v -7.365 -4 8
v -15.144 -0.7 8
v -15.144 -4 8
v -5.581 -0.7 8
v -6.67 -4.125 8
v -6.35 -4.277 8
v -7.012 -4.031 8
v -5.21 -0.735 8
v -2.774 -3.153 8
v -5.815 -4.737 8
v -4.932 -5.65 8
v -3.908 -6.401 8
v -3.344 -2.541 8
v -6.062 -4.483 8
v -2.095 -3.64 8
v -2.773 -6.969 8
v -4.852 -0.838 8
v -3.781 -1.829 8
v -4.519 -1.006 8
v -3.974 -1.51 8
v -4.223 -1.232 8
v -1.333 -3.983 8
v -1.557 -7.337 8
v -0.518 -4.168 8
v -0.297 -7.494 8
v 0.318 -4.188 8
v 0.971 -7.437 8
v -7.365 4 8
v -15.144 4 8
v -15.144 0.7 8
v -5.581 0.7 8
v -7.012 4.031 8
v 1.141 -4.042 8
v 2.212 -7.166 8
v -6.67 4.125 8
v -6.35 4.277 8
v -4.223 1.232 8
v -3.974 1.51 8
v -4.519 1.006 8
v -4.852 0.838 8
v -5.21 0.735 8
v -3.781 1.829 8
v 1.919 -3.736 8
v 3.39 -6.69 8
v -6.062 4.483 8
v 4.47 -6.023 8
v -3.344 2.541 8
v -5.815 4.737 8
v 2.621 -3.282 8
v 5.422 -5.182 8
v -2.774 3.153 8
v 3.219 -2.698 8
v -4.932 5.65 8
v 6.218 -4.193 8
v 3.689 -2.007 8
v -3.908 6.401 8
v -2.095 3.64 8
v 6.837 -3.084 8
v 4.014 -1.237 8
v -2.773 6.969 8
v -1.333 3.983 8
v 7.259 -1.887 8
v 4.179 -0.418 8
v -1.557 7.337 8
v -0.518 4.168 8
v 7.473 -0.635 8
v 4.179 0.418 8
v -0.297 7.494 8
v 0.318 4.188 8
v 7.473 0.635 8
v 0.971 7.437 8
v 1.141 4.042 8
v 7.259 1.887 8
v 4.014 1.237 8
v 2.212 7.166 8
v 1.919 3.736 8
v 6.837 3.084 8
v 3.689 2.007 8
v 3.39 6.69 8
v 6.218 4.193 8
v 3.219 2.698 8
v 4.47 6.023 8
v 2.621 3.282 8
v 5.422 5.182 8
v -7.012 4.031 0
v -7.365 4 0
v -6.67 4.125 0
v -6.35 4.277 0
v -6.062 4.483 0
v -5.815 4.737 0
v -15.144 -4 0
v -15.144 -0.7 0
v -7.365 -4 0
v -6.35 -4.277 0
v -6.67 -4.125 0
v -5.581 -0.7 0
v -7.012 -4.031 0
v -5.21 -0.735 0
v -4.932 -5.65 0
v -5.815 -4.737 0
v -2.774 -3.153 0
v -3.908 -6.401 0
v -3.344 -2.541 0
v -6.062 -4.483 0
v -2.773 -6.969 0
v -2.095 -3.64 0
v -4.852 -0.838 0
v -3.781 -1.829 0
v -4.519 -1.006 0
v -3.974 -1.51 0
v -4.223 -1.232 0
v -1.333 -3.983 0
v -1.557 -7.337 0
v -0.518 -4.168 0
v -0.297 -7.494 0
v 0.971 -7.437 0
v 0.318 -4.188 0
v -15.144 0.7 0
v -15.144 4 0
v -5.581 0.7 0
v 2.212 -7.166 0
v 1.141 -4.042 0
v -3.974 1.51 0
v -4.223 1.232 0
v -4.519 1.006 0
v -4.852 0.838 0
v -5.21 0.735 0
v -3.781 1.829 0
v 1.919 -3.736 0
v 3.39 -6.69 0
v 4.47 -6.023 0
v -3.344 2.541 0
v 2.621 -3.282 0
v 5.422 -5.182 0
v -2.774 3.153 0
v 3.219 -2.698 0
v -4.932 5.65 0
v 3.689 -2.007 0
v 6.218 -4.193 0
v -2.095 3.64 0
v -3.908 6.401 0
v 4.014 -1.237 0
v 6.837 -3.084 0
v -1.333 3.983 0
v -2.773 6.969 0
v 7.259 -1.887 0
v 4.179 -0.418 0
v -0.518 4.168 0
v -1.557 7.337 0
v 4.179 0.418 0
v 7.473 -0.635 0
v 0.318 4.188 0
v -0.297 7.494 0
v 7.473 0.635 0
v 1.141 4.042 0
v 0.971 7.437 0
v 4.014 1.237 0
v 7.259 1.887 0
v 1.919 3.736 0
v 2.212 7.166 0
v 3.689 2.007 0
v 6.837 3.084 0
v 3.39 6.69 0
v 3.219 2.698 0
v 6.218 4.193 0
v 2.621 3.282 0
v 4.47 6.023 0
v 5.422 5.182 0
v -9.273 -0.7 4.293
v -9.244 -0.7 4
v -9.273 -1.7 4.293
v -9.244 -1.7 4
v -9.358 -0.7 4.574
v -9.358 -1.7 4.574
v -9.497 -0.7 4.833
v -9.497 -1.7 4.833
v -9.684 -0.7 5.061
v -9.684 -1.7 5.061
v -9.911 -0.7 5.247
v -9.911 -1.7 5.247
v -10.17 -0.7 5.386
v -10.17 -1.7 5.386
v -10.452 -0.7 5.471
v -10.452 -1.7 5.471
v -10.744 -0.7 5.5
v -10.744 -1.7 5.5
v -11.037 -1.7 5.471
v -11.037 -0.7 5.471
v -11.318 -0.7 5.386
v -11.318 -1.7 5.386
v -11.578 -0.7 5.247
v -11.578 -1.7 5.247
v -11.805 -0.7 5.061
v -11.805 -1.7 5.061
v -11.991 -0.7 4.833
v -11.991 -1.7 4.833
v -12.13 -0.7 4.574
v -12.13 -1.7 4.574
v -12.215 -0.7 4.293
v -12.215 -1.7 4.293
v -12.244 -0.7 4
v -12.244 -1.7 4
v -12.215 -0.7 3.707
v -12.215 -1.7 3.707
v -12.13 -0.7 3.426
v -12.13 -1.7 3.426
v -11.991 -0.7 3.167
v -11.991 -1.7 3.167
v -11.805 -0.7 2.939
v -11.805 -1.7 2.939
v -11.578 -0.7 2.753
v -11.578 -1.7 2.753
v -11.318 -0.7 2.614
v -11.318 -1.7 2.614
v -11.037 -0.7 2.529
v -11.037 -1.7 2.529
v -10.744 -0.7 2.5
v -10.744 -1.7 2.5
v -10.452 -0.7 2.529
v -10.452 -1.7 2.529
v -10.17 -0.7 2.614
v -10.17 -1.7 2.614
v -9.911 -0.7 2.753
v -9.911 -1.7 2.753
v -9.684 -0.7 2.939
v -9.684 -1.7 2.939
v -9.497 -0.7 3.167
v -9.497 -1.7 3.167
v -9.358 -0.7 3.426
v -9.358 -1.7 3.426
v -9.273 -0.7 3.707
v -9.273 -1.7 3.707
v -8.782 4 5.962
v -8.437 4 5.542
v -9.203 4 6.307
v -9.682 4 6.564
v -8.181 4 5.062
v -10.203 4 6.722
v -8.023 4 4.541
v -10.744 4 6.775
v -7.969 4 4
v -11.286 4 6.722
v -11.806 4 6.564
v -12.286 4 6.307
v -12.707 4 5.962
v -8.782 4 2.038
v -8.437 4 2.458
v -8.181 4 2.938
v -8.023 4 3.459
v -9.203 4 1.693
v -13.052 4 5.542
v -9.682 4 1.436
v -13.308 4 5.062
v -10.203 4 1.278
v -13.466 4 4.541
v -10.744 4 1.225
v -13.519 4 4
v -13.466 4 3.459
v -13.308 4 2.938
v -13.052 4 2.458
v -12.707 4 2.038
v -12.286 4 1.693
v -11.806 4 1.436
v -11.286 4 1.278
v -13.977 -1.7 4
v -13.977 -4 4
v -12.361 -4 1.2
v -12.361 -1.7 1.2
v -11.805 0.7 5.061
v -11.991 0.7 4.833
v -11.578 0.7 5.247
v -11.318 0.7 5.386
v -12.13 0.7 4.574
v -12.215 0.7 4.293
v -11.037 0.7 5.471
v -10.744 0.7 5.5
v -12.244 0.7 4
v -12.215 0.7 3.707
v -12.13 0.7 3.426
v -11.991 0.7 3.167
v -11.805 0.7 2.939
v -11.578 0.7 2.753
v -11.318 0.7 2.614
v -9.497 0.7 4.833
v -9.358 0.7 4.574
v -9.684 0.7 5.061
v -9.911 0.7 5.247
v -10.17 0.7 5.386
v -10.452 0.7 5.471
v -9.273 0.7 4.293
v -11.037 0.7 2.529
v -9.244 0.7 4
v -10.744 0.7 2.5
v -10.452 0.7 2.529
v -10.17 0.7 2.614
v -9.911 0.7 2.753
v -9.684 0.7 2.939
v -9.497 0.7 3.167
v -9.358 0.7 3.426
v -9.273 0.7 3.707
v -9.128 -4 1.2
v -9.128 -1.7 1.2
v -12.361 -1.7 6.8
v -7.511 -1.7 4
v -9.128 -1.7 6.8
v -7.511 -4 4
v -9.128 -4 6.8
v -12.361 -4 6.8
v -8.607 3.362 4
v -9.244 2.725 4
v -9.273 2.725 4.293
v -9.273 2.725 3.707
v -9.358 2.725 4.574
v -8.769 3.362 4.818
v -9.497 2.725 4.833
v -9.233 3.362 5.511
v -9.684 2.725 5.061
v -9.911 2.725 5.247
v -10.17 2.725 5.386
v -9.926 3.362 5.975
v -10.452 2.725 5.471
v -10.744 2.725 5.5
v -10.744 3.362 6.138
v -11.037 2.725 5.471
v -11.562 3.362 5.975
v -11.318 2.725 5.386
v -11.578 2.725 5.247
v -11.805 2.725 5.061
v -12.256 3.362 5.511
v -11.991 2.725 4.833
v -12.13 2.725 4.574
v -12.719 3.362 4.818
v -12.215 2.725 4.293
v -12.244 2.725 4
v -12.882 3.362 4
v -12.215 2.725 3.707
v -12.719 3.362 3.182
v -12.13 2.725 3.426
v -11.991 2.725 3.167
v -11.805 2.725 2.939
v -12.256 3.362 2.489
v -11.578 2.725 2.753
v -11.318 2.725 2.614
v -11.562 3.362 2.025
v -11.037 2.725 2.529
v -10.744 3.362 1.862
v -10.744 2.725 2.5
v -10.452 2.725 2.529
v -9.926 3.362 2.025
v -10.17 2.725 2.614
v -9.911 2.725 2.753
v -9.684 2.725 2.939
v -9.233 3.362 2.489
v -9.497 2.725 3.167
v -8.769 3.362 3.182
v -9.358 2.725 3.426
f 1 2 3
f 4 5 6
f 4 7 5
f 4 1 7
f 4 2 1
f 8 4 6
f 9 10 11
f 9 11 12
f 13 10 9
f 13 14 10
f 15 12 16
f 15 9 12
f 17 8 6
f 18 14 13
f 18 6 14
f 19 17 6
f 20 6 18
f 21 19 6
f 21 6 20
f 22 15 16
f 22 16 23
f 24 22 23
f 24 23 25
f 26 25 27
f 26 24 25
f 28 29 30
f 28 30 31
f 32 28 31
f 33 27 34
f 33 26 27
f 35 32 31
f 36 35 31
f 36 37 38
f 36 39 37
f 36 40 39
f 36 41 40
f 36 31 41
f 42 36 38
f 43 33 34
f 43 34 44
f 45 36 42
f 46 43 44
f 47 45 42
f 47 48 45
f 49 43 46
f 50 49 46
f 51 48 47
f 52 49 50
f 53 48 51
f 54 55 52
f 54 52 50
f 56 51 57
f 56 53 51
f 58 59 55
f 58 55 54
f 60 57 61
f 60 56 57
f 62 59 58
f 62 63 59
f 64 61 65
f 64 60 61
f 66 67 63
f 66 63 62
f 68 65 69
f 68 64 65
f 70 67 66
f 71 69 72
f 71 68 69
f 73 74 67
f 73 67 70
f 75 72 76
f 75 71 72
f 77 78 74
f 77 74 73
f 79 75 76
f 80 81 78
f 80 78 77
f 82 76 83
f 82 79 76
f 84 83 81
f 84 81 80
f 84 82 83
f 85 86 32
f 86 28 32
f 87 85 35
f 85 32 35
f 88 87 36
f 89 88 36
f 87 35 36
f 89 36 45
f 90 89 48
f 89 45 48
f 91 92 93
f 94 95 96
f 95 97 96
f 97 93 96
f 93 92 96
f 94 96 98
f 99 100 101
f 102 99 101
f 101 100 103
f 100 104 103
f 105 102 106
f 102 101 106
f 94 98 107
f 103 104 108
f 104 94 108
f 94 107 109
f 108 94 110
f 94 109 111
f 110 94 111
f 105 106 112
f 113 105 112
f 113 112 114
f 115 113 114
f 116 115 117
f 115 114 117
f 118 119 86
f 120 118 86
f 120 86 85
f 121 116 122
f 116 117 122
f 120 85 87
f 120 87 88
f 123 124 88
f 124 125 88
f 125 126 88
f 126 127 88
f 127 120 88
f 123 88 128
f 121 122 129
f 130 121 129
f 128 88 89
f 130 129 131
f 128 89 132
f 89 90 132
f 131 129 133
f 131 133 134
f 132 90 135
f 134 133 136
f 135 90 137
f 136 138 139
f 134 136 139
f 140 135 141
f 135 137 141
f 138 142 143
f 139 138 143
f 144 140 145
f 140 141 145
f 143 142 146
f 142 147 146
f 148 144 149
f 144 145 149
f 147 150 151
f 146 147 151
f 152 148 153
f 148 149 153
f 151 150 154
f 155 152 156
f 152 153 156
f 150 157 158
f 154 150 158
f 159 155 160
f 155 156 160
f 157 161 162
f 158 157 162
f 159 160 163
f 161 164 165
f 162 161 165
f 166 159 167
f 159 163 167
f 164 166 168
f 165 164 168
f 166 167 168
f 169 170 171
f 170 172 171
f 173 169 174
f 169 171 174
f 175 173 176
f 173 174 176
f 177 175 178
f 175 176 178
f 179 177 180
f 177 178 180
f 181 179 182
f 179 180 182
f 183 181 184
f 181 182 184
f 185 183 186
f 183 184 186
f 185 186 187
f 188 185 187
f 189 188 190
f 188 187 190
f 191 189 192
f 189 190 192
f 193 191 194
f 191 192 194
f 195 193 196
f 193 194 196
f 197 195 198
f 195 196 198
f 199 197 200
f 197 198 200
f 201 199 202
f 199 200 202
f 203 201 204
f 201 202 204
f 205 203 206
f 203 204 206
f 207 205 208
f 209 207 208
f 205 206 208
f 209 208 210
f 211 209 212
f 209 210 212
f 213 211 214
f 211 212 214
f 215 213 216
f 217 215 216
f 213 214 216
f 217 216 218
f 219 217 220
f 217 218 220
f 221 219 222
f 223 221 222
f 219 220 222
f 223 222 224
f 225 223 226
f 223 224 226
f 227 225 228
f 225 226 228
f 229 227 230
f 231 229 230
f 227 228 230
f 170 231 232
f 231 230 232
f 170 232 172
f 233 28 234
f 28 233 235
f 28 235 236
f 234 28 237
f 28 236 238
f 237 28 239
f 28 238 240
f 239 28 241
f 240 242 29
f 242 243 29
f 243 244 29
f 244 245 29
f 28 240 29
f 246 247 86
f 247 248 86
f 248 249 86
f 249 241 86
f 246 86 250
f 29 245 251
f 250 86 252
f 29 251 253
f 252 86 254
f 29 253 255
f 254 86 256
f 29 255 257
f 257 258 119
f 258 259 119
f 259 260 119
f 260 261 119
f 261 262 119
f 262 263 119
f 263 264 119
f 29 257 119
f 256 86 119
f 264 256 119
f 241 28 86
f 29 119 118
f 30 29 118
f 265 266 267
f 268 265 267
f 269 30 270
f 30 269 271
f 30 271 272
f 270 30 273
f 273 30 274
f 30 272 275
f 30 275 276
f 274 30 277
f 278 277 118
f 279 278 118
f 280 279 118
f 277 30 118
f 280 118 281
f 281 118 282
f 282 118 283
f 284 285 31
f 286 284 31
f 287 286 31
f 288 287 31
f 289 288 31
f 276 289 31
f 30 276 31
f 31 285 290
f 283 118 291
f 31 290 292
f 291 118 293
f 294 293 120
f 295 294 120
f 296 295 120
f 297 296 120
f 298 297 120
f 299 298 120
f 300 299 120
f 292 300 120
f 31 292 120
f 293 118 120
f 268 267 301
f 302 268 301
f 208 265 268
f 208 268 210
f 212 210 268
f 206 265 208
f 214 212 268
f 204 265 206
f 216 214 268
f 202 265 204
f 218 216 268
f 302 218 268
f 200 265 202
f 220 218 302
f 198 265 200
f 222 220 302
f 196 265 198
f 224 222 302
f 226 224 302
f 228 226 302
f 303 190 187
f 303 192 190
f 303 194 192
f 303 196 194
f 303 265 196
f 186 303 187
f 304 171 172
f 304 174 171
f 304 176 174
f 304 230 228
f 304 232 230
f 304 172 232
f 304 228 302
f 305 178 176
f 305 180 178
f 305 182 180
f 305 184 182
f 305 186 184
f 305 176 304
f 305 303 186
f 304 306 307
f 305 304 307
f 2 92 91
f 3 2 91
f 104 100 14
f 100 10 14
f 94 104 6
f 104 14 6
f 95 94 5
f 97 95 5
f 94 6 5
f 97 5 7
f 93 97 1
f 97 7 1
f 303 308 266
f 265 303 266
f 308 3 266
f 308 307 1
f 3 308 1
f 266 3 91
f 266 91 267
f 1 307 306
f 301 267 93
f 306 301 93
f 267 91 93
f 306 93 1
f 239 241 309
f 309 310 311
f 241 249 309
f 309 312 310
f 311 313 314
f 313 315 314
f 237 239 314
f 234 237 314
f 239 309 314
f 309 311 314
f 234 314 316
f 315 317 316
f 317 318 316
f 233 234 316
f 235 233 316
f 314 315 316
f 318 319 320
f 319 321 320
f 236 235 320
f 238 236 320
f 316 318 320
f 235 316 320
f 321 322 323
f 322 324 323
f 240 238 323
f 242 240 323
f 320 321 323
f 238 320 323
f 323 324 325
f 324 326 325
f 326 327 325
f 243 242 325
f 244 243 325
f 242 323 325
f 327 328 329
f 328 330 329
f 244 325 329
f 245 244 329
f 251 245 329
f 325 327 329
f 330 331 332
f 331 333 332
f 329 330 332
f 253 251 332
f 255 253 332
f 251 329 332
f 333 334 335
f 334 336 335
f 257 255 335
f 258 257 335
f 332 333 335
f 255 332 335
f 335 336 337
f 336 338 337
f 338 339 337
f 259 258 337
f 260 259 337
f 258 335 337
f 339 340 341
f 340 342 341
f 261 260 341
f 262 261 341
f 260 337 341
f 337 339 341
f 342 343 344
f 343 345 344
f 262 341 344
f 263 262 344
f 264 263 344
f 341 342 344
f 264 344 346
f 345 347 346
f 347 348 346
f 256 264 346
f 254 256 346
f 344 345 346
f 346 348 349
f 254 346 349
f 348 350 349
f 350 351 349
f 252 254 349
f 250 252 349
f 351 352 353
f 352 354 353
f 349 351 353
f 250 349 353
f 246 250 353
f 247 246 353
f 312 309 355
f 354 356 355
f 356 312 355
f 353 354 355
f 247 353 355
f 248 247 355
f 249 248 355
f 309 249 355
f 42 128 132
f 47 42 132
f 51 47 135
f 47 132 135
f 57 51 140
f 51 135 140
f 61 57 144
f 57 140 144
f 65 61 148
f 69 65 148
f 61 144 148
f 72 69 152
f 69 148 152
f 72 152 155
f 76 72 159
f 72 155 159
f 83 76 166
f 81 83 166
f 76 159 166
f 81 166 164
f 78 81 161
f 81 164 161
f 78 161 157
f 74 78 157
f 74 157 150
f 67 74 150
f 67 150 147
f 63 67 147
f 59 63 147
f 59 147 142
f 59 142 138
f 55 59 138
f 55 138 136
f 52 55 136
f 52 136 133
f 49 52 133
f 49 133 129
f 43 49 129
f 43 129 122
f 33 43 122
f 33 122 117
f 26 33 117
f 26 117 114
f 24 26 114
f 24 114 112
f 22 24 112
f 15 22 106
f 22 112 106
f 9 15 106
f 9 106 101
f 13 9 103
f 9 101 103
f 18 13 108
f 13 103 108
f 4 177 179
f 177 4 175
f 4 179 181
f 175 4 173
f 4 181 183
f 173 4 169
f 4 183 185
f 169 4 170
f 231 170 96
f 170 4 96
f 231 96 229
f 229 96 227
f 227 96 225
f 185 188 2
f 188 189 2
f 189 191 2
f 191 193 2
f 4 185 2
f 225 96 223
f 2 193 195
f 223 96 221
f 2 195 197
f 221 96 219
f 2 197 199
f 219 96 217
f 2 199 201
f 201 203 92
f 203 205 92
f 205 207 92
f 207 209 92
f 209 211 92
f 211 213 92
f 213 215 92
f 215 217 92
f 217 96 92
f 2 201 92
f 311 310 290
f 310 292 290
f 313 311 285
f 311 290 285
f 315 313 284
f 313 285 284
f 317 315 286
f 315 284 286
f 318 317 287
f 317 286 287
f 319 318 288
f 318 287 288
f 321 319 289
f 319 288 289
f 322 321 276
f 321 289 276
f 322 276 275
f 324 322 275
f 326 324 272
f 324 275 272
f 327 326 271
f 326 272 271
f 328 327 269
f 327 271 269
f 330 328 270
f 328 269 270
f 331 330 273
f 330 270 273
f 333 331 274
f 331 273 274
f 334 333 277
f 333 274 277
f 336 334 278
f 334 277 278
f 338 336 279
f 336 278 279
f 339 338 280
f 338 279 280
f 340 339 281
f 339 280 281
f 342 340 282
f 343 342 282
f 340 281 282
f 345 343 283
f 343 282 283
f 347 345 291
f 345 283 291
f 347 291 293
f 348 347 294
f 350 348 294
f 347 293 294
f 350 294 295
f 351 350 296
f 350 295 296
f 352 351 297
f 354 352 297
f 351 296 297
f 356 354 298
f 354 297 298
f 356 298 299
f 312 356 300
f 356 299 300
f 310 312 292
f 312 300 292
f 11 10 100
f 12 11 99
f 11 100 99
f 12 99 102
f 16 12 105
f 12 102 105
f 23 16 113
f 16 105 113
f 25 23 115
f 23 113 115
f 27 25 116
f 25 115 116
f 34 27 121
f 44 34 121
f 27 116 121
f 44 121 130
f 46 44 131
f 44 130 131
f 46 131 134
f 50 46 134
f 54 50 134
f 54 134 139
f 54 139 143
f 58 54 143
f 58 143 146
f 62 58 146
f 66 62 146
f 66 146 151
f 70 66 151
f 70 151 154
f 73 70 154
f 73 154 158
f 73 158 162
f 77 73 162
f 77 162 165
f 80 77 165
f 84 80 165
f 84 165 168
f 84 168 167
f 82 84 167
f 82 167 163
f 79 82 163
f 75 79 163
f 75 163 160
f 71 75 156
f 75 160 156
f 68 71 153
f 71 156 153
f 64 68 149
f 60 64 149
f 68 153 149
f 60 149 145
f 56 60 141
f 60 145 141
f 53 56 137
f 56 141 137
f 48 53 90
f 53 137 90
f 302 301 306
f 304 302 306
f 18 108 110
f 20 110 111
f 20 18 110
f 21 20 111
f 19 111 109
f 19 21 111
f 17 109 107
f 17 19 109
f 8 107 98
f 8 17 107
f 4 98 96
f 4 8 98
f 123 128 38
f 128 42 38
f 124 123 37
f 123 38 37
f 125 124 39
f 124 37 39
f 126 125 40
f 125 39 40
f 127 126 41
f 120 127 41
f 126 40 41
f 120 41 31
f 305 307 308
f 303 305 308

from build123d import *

# Parameters (mm, degrees)
F1_DEPTH       = 8
F3_DEPTH       = 2.3
F5_D           = 3
F5_CSINK_D     = 5.55
F5_CSINK_ANGLE = 90
F6_R           = 2


with BuildPart() as f1:
    # F0 (on Top) → F1 (new body)
    with BuildSketch(Plane.XY):
        with BuildLine():
            ThreePointArc((-4.141256, 0.7), (4.2, 0), (-4.141256, -0.7))
            Line((-4.141256, -0.7), (-7.467262, -0.7))
            Line((-7.467262, -0.7), (-15.144289, -0.7))
            Line((-15.144289, -0.7), (-15.144289, -4))
            Line((-15.144289, -4), (-6.344289, -4))
            ThreePointArc((-6.344289, -4), (7.5, 0), (-6.344289, 4))
            Line((-6.344289, 4), (-15.144289, 4))
            Line((-15.144289, 4), (-15.144289, 0.7))
            Line((-15.144289, 0.7), (-7.467262, 0.7))
            Line((-7.467262, 0.7), (-4.141256, 0.7))
        make_face()
    extrude(amount=F1_DEPTH)

    # F2 (on face) → F3 (cut)
    with BuildSketch(Plane.XZ.offset(4)):
        Polygon((-12.36087, 1.2), (-9.127708, 1.2), (-7.511127, 4), (-9.127708, 6.8), (-12.36087, 6.8), (-13.97745, 4), align=None)
    extrude(amount=-F3_DEPTH, mode=Mode.SUBTRACT)

    # F5 (through all)
    with Locations(Plane(origin=(0, 4, 0), x_dir=(-1, 0, 0), z_dir=(0, 1, 0))):
        with Locations((10.744289, 4)):
            CounterSinkHole(F5_D / 2, F5_CSINK_D / 2, counter_sink_angle=F5_CSINK_ANGLE)

    # F6
    f6_edges = [f1.edges().sort_by_distance(p)[0] for p in [
        (-4.141256, -0.7, 4),
        (-4.141256, 0.7, 4),
        (-6.344289, -4, 4),
        (-6.344289, 4, 4),
    ]]
    fillet(f6_edges, radius=F6_R)


solid = f1.part
